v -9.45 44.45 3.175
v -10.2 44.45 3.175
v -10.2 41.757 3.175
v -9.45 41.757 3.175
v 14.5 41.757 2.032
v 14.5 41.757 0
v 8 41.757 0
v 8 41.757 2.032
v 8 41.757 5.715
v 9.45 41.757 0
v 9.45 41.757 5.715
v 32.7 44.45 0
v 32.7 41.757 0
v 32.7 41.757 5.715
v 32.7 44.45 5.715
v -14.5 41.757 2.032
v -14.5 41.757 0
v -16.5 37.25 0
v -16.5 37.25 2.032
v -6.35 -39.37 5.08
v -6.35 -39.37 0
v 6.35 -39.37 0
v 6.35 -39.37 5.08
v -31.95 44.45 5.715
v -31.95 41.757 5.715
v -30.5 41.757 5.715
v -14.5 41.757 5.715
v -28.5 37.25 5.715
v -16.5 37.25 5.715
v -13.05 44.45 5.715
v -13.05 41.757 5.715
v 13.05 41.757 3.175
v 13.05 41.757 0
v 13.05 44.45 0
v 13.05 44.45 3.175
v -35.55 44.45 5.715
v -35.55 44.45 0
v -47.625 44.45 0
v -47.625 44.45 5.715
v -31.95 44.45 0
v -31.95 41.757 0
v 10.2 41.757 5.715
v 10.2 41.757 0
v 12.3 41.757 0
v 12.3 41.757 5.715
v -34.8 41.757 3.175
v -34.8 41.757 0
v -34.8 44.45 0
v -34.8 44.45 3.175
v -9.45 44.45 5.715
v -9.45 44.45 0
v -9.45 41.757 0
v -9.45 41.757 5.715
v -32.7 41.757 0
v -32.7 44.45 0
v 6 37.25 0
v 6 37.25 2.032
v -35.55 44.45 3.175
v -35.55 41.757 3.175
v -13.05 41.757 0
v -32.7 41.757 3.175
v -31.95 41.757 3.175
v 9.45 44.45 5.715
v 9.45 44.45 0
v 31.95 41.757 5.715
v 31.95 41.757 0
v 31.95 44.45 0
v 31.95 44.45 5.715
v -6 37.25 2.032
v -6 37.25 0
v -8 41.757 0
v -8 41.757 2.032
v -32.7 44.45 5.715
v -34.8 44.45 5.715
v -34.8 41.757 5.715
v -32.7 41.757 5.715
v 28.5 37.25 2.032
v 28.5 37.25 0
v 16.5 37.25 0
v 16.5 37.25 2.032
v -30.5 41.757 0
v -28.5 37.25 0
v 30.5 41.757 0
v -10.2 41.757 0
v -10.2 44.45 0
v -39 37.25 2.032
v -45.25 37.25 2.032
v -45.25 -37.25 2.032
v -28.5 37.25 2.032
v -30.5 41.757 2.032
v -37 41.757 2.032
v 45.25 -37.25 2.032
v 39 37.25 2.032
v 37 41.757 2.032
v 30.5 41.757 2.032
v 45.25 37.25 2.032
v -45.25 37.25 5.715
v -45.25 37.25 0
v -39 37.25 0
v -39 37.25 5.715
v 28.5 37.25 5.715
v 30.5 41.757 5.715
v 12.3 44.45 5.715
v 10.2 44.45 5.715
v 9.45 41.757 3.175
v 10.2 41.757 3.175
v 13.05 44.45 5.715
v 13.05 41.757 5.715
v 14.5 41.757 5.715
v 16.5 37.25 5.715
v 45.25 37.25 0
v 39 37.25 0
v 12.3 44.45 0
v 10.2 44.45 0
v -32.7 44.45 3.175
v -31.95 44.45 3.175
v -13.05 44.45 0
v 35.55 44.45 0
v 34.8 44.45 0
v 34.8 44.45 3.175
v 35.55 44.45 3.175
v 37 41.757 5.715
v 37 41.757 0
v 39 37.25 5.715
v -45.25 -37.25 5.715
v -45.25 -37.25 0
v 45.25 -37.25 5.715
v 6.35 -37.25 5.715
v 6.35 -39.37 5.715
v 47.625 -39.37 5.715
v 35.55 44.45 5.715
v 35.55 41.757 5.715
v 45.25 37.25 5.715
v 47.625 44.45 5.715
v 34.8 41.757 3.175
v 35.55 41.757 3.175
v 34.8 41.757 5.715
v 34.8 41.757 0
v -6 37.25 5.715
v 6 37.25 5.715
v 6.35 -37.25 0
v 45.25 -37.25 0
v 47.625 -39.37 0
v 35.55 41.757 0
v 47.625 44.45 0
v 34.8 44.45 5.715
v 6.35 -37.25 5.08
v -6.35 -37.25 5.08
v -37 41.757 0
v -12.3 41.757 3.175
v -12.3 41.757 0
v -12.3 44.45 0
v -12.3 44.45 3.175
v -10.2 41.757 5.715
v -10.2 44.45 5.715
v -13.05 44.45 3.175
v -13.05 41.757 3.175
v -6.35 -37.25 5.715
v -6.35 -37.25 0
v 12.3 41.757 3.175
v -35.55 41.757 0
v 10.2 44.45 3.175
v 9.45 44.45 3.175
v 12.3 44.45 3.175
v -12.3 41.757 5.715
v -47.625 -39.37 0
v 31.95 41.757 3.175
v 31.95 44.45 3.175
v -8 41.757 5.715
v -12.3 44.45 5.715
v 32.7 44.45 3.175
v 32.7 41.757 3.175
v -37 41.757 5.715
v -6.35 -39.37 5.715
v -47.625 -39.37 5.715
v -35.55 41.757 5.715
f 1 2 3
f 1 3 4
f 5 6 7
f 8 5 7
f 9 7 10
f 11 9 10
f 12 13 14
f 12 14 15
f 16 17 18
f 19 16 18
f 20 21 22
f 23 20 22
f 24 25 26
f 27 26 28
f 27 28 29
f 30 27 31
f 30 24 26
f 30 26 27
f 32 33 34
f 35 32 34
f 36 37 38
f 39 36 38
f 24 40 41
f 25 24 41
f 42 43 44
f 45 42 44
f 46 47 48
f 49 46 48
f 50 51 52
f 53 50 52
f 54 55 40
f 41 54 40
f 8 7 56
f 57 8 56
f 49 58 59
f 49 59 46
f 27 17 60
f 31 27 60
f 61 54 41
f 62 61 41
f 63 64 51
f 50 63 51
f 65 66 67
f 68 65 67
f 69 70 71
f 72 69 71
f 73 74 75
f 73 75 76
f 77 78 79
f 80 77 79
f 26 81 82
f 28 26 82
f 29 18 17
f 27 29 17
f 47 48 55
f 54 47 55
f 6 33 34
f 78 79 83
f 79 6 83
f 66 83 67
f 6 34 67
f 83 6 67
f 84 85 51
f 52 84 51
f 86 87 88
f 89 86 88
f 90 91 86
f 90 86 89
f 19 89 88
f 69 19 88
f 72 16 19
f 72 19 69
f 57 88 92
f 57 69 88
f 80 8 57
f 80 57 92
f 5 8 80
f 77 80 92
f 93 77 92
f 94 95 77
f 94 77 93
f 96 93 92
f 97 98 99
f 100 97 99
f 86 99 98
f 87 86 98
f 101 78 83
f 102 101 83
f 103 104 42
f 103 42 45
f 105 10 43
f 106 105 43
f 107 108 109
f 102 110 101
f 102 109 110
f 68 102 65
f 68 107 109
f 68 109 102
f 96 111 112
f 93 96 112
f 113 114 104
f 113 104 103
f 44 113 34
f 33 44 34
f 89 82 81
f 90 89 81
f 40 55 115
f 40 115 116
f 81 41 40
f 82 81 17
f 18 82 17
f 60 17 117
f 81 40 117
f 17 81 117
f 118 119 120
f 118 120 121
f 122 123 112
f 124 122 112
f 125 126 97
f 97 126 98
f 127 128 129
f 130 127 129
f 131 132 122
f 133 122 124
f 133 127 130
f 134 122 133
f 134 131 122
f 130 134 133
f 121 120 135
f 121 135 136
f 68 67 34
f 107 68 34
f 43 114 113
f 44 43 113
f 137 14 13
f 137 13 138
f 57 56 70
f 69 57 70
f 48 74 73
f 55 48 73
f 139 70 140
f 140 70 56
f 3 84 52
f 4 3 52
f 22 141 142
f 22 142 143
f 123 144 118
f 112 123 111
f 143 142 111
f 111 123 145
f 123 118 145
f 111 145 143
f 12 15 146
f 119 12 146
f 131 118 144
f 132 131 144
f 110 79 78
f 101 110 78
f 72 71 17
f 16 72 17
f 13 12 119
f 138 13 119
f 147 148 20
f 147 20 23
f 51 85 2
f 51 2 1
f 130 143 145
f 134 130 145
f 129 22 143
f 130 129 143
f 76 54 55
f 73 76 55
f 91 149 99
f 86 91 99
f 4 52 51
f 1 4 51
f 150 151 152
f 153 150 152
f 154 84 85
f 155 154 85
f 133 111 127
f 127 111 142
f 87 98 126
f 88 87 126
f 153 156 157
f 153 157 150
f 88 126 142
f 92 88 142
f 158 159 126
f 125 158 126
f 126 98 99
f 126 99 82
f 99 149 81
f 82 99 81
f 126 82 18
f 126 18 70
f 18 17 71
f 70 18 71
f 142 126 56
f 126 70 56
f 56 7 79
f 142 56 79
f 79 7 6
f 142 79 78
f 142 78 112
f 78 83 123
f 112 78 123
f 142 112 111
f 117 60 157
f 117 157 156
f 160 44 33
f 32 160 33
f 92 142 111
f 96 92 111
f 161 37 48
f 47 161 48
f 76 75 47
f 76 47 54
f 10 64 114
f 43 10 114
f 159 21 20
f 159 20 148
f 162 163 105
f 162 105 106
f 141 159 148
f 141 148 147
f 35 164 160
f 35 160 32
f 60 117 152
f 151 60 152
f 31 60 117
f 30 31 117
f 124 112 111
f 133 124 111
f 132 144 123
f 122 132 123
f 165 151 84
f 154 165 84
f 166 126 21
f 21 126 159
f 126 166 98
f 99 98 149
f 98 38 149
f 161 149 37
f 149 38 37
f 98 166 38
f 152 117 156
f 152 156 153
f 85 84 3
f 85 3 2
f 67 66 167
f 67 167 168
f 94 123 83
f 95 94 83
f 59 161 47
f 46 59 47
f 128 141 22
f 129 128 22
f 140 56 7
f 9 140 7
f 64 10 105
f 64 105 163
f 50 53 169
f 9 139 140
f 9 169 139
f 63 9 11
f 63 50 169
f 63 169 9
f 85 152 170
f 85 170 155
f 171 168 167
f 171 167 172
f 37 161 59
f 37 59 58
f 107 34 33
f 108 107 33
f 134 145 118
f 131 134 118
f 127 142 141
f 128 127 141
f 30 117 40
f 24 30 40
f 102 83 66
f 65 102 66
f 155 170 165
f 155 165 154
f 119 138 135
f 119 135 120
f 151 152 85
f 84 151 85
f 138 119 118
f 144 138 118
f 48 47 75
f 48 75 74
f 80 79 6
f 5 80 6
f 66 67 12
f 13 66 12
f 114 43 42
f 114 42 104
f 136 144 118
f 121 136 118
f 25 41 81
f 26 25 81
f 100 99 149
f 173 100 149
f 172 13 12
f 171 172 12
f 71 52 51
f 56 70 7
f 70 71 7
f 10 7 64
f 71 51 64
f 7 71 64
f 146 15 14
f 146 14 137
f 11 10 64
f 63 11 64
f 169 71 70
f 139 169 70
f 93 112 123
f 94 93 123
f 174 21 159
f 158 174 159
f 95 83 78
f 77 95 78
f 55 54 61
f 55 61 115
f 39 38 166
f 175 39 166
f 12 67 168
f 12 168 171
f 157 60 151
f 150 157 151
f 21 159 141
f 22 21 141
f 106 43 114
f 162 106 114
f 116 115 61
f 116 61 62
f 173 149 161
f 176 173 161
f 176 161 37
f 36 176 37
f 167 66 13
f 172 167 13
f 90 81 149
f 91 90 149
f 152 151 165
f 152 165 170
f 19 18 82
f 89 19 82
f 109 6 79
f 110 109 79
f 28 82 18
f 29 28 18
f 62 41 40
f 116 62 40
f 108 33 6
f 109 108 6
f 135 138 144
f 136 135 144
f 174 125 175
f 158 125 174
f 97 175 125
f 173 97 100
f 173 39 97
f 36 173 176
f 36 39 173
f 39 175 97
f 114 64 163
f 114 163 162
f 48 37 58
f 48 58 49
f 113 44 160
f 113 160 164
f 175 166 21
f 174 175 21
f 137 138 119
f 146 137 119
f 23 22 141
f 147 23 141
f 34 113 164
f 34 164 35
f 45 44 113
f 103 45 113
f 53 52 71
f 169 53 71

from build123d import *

# Parameters (mm, degrees)
F0_W     = 2.1
F0_H     = 2.693116
F1_DEPTH = 5.715
F2_DEPTH = 2.032
F0_W_2   = 0.75
F3_DEPTH = 3.175
F0_W_3   = 12.7
F0_H_2   = 2.12
F4_DEPTH = 5.08


with BuildPart() as f1:
    # F0 (on Top) → F1 (new body)
    with BuildSketch(Plane.XY):
        Polygon((16.5, 37.25), (28.5, 37.25), (30.5, 41.756884), (31.95, 41.756884), (31.95, 44.45), (13.05, 44.45), (13.05, 41.756884), (14.5, 41.756884), align=None)
        Polygon((-6, 37.25), (6, 37.25), (8, 41.756884), (9.45, 41.756884), (9.45, 44.45), (-9.45, 44.45), (-9.45, 41.756884), (-8, 41.756884), align=None)
        Polygon((-30.5, 41.756884), (-28.5, 37.25), (-16.5, 37.25), (-14.5, 41.756884), (-13.05, 41.756884), (-13.05, 44.45), (-31.95, 44.45), (-31.95, 41.756884), align=None)
        Polygon((45.25, 37.25), (45.25, -37.25), (6.35, -37.25), (6.35, -39.37), (47.625, -39.37), (47.625, 44.45), (35.55, 44.45), (35.55, 41.756884), (37, 41.756884), (39, 37.25), align=None)
        Polygon((-6.35, -39.37), (-6.35, -37.25), (-45.25, -37.25), (-45.25, 37.25), (-39, 37.25), (-37, 41.756884), (-35.55, 41.756884), (-35.55, 44.45), (-47.625, 44.45), (-47.625, -39.37), align=None)
        with Locations((-33.75, 43.103442)):
            Rectangle(F0_W, F0_H)
        with Locations((-11.25, 43.103442)):
            Rectangle(F0_W, F0_H)
        with Locations((11.25, 43.103442)):
            Rectangle(F0_W, F0_H)
        with Locations((33.75, 43.103442)):
            Rectangle(F0_W, F0_H)
    extrude(amount=F1_DEPTH)


with BuildPart() as f2:
    # F0 (on Top) → F2 (new body)
    with BuildSketch(Plane.XY):
        Polygon((6.35, -37.25), (45.25, -37.25), (45.25, 37.25), (39, 37.25), (28.5, 37.25), (16.5, 37.25), (6, 37.25), (-6, 37.25), (-16.5, 37.25), (-28.5, 37.25), (-39, 37.25), (-45.25, 37.25), (-45.25, -37.25), (-6.35, -37.25), align=None)
        Polygon((6, 37.25), (16.5, 37.25), (14.5, 41.756884), (13.05, 41.756884), (12.3, 41.756884), (10.2, 41.756884), (9.45, 41.756884), (8, 41.756884), align=None)
        Polygon((-37, 41.756884), (-39, 37.25), (-28.5, 37.25), (-30.5, 41.756884), (-31.95, 41.756884), (-32.7, 41.756884), (-34.8, 41.756884), (-35.55, 41.756884), align=None)
        Polygon((28.5, 37.25), (39, 37.25), (37, 41.756884), (35.55, 41.756884), (34.8, 41.756884), (32.7, 41.756884), (31.95, 41.756884), (30.5, 41.756884), align=None)
        Polygon((-16.5, 37.25), (-6, 37.25), (-8, 41.756884), (-9.45, 41.756884), (-10.2, 41.756884), (-12.3, 41.756884), (-13.05, 41.756884), (-14.5, 41.756884), align=None)
    extrude(amount=F2_DEPTH)


with BuildPart() as f3:
    # F0 (on Top) → F3 (new body)
    with BuildSketch(Plane.XY):
        with Locations((-32.325, 43.103442)):
            Rectangle(F0_W_2, F0_H)
        with Locations((-9.825, 43.103442)):
            Rectangle(F0_W_2, F0_H)
        with Locations((9.825, 43.103442)):
            Rectangle(F0_W_2, F0_H)
        with Locations((35.175, 43.103442)):
            Rectangle(F0_W_2, F0_H)
        with Locations((12.675, 43.103442)):
            Rectangle(F0_W_2, F0_H)
        with Locations((-12.675, 43.103442)):
            Rectangle(F0_W_2, F0_H)
        with Locations((-35.175, 43.103442)):
            Rectangle(F0_W_2, F0_H)
        with Locations((32.325, 43.103442)):
            Rectangle(F0_W_2, F0_H)
    extrude(amount=F3_DEPTH)


with BuildPart() as f4:
    # F0 (on Top) → F4 (new body)
    with BuildSketch(Plane.XY):
        with Locations((0, -38.31)):
            Rectangle(F0_W_3, F0_H_2)
    extrude(amount=F4_DEPTH)


solid = Compound([f1.part, f2.part, f3.part, f4.part])
